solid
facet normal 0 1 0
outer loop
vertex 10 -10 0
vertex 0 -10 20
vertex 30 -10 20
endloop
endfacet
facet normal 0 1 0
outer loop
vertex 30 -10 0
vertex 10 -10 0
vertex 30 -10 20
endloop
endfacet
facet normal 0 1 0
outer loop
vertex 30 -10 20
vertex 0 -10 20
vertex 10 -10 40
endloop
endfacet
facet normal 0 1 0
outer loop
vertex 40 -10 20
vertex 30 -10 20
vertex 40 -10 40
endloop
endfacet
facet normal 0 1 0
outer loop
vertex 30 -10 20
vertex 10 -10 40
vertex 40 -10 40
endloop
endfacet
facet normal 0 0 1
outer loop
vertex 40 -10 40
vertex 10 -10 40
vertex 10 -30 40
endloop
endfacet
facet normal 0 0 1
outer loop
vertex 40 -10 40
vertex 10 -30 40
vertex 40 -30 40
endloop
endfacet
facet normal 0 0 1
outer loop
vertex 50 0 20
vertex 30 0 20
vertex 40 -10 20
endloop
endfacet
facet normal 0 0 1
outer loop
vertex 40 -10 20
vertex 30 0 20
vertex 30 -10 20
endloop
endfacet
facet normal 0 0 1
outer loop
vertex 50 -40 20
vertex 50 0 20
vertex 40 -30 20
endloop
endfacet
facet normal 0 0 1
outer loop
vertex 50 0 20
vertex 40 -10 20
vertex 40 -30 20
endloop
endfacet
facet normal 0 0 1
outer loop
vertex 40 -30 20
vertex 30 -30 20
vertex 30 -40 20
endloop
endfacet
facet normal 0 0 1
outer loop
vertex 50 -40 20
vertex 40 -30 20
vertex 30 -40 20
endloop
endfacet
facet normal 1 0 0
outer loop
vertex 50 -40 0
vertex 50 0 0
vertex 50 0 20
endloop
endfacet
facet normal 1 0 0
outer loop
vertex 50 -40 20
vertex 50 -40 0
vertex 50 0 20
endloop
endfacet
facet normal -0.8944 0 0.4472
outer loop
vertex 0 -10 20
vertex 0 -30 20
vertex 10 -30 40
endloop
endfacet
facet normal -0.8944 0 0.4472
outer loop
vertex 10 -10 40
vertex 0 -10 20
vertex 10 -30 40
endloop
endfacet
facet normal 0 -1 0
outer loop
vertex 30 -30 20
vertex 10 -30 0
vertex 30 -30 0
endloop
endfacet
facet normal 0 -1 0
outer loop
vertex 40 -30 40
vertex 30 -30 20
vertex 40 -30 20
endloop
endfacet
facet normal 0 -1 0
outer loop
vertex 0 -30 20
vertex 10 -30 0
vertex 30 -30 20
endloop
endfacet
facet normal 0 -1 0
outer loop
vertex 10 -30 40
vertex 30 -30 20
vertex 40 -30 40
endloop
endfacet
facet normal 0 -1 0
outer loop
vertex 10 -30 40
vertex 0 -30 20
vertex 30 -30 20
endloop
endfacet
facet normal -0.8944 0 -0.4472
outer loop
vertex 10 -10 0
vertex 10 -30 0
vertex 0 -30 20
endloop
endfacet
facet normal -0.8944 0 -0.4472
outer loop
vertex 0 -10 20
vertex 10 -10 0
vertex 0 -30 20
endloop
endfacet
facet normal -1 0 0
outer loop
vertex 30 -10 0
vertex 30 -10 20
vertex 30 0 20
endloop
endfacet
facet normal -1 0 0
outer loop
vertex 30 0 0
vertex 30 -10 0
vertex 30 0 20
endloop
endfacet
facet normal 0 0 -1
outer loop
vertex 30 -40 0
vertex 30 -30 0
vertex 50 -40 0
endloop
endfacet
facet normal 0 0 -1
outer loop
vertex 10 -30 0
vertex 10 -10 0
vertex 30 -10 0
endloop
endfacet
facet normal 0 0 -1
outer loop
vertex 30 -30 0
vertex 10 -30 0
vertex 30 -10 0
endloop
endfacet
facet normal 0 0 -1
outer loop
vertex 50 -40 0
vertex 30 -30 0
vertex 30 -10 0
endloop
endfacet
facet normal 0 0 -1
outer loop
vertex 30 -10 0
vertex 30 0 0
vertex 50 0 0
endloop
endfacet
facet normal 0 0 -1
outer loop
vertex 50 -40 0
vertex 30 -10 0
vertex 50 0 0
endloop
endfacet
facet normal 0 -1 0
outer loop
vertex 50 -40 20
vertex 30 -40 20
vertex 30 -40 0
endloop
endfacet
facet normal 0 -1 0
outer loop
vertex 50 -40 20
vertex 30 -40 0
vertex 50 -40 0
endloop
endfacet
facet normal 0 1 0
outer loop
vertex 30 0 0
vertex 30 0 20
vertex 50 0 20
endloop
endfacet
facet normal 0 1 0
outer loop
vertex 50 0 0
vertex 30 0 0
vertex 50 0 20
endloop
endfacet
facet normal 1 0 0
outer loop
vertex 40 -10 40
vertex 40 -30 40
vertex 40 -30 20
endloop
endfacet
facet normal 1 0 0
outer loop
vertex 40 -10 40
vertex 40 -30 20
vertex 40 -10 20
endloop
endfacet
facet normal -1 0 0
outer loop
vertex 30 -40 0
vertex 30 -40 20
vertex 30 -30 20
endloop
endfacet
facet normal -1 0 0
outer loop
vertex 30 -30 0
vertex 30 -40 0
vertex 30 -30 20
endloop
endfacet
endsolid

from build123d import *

# Parameters (mm, degrees)
F0_W      = 50
F0_H      = 40
F1_DEPTH  = 40
F2_W      = 10
F2_H      = 20
F3_DEPTH  = 50.001
F4_W      = 30
F4_H      = 10
F5_DEPTH  = 20.001
F6_W      = 10
F6_H      = 20
F7_DEPTH  = 20
F9_DEPTH  = 30.001
F10_DEPTH = 30.001


with BuildPart() as f1:
    # F0 (on Front) → F1 (new body)
    with BuildSketch(Plane.XZ):
        with Locations((25, 20)):
            Rectangle(F0_W, F0_H)
    extrude(amount=F1_DEPTH)

    # F2 (on face) → F3 (cut, through all)
    with BuildSketch(Plane(origin=(0, 0, 0), x_dir=(0, -1, 0), z_dir=(-1, 0, 0))):
        with Locations((5, 30)):
            Rectangle(F2_W, F2_H)
        with Locations((35, 30)):
            Rectangle(F2_W, F2_H)
    extrude(amount=-F3_DEPTH, mode=Mode.SUBTRACT)

    # F4 (on face) → F5 (cut, through all)
    with BuildSketch(Plane.XY.offset(20)):
        with Locations((15, -5)):
            Rectangle(F4_W, F4_H)
        with Locations((15, -35)):
            Rectangle(F4_W, F4_H)
    extrude(amount=-F5_DEPTH, mode=Mode.SUBTRACT)

    # F6 (on face) → F7 (cut, through all)
    with BuildSketch(Plane.XY.offset(40)):
        with Locations((45, -20)):
            Rectangle(F6_W, F6_H)
    extrude(amount=-F7_DEPTH, mode=Mode.SUBTRACT)

    # F8 (on face) → F9 (cut, through all)
    with BuildSketch(Plane.XZ.offset(30)):
        Polygon((10, 40), (0, 40), (0, 20), align=None)
    extrude(amount=-F9_DEPTH, mode=Mode.SUBTRACT)

    # F8 (on face) → F10 (cut, through all)
    with BuildSketch(Plane.XZ.offset(30)):
        Polygon((10, 0), (0, 20), (0, 0), align=None)
    extrude(amount=-F10_DEPTH, mode=Mode.SUBTRACT)


solid = f1.part
